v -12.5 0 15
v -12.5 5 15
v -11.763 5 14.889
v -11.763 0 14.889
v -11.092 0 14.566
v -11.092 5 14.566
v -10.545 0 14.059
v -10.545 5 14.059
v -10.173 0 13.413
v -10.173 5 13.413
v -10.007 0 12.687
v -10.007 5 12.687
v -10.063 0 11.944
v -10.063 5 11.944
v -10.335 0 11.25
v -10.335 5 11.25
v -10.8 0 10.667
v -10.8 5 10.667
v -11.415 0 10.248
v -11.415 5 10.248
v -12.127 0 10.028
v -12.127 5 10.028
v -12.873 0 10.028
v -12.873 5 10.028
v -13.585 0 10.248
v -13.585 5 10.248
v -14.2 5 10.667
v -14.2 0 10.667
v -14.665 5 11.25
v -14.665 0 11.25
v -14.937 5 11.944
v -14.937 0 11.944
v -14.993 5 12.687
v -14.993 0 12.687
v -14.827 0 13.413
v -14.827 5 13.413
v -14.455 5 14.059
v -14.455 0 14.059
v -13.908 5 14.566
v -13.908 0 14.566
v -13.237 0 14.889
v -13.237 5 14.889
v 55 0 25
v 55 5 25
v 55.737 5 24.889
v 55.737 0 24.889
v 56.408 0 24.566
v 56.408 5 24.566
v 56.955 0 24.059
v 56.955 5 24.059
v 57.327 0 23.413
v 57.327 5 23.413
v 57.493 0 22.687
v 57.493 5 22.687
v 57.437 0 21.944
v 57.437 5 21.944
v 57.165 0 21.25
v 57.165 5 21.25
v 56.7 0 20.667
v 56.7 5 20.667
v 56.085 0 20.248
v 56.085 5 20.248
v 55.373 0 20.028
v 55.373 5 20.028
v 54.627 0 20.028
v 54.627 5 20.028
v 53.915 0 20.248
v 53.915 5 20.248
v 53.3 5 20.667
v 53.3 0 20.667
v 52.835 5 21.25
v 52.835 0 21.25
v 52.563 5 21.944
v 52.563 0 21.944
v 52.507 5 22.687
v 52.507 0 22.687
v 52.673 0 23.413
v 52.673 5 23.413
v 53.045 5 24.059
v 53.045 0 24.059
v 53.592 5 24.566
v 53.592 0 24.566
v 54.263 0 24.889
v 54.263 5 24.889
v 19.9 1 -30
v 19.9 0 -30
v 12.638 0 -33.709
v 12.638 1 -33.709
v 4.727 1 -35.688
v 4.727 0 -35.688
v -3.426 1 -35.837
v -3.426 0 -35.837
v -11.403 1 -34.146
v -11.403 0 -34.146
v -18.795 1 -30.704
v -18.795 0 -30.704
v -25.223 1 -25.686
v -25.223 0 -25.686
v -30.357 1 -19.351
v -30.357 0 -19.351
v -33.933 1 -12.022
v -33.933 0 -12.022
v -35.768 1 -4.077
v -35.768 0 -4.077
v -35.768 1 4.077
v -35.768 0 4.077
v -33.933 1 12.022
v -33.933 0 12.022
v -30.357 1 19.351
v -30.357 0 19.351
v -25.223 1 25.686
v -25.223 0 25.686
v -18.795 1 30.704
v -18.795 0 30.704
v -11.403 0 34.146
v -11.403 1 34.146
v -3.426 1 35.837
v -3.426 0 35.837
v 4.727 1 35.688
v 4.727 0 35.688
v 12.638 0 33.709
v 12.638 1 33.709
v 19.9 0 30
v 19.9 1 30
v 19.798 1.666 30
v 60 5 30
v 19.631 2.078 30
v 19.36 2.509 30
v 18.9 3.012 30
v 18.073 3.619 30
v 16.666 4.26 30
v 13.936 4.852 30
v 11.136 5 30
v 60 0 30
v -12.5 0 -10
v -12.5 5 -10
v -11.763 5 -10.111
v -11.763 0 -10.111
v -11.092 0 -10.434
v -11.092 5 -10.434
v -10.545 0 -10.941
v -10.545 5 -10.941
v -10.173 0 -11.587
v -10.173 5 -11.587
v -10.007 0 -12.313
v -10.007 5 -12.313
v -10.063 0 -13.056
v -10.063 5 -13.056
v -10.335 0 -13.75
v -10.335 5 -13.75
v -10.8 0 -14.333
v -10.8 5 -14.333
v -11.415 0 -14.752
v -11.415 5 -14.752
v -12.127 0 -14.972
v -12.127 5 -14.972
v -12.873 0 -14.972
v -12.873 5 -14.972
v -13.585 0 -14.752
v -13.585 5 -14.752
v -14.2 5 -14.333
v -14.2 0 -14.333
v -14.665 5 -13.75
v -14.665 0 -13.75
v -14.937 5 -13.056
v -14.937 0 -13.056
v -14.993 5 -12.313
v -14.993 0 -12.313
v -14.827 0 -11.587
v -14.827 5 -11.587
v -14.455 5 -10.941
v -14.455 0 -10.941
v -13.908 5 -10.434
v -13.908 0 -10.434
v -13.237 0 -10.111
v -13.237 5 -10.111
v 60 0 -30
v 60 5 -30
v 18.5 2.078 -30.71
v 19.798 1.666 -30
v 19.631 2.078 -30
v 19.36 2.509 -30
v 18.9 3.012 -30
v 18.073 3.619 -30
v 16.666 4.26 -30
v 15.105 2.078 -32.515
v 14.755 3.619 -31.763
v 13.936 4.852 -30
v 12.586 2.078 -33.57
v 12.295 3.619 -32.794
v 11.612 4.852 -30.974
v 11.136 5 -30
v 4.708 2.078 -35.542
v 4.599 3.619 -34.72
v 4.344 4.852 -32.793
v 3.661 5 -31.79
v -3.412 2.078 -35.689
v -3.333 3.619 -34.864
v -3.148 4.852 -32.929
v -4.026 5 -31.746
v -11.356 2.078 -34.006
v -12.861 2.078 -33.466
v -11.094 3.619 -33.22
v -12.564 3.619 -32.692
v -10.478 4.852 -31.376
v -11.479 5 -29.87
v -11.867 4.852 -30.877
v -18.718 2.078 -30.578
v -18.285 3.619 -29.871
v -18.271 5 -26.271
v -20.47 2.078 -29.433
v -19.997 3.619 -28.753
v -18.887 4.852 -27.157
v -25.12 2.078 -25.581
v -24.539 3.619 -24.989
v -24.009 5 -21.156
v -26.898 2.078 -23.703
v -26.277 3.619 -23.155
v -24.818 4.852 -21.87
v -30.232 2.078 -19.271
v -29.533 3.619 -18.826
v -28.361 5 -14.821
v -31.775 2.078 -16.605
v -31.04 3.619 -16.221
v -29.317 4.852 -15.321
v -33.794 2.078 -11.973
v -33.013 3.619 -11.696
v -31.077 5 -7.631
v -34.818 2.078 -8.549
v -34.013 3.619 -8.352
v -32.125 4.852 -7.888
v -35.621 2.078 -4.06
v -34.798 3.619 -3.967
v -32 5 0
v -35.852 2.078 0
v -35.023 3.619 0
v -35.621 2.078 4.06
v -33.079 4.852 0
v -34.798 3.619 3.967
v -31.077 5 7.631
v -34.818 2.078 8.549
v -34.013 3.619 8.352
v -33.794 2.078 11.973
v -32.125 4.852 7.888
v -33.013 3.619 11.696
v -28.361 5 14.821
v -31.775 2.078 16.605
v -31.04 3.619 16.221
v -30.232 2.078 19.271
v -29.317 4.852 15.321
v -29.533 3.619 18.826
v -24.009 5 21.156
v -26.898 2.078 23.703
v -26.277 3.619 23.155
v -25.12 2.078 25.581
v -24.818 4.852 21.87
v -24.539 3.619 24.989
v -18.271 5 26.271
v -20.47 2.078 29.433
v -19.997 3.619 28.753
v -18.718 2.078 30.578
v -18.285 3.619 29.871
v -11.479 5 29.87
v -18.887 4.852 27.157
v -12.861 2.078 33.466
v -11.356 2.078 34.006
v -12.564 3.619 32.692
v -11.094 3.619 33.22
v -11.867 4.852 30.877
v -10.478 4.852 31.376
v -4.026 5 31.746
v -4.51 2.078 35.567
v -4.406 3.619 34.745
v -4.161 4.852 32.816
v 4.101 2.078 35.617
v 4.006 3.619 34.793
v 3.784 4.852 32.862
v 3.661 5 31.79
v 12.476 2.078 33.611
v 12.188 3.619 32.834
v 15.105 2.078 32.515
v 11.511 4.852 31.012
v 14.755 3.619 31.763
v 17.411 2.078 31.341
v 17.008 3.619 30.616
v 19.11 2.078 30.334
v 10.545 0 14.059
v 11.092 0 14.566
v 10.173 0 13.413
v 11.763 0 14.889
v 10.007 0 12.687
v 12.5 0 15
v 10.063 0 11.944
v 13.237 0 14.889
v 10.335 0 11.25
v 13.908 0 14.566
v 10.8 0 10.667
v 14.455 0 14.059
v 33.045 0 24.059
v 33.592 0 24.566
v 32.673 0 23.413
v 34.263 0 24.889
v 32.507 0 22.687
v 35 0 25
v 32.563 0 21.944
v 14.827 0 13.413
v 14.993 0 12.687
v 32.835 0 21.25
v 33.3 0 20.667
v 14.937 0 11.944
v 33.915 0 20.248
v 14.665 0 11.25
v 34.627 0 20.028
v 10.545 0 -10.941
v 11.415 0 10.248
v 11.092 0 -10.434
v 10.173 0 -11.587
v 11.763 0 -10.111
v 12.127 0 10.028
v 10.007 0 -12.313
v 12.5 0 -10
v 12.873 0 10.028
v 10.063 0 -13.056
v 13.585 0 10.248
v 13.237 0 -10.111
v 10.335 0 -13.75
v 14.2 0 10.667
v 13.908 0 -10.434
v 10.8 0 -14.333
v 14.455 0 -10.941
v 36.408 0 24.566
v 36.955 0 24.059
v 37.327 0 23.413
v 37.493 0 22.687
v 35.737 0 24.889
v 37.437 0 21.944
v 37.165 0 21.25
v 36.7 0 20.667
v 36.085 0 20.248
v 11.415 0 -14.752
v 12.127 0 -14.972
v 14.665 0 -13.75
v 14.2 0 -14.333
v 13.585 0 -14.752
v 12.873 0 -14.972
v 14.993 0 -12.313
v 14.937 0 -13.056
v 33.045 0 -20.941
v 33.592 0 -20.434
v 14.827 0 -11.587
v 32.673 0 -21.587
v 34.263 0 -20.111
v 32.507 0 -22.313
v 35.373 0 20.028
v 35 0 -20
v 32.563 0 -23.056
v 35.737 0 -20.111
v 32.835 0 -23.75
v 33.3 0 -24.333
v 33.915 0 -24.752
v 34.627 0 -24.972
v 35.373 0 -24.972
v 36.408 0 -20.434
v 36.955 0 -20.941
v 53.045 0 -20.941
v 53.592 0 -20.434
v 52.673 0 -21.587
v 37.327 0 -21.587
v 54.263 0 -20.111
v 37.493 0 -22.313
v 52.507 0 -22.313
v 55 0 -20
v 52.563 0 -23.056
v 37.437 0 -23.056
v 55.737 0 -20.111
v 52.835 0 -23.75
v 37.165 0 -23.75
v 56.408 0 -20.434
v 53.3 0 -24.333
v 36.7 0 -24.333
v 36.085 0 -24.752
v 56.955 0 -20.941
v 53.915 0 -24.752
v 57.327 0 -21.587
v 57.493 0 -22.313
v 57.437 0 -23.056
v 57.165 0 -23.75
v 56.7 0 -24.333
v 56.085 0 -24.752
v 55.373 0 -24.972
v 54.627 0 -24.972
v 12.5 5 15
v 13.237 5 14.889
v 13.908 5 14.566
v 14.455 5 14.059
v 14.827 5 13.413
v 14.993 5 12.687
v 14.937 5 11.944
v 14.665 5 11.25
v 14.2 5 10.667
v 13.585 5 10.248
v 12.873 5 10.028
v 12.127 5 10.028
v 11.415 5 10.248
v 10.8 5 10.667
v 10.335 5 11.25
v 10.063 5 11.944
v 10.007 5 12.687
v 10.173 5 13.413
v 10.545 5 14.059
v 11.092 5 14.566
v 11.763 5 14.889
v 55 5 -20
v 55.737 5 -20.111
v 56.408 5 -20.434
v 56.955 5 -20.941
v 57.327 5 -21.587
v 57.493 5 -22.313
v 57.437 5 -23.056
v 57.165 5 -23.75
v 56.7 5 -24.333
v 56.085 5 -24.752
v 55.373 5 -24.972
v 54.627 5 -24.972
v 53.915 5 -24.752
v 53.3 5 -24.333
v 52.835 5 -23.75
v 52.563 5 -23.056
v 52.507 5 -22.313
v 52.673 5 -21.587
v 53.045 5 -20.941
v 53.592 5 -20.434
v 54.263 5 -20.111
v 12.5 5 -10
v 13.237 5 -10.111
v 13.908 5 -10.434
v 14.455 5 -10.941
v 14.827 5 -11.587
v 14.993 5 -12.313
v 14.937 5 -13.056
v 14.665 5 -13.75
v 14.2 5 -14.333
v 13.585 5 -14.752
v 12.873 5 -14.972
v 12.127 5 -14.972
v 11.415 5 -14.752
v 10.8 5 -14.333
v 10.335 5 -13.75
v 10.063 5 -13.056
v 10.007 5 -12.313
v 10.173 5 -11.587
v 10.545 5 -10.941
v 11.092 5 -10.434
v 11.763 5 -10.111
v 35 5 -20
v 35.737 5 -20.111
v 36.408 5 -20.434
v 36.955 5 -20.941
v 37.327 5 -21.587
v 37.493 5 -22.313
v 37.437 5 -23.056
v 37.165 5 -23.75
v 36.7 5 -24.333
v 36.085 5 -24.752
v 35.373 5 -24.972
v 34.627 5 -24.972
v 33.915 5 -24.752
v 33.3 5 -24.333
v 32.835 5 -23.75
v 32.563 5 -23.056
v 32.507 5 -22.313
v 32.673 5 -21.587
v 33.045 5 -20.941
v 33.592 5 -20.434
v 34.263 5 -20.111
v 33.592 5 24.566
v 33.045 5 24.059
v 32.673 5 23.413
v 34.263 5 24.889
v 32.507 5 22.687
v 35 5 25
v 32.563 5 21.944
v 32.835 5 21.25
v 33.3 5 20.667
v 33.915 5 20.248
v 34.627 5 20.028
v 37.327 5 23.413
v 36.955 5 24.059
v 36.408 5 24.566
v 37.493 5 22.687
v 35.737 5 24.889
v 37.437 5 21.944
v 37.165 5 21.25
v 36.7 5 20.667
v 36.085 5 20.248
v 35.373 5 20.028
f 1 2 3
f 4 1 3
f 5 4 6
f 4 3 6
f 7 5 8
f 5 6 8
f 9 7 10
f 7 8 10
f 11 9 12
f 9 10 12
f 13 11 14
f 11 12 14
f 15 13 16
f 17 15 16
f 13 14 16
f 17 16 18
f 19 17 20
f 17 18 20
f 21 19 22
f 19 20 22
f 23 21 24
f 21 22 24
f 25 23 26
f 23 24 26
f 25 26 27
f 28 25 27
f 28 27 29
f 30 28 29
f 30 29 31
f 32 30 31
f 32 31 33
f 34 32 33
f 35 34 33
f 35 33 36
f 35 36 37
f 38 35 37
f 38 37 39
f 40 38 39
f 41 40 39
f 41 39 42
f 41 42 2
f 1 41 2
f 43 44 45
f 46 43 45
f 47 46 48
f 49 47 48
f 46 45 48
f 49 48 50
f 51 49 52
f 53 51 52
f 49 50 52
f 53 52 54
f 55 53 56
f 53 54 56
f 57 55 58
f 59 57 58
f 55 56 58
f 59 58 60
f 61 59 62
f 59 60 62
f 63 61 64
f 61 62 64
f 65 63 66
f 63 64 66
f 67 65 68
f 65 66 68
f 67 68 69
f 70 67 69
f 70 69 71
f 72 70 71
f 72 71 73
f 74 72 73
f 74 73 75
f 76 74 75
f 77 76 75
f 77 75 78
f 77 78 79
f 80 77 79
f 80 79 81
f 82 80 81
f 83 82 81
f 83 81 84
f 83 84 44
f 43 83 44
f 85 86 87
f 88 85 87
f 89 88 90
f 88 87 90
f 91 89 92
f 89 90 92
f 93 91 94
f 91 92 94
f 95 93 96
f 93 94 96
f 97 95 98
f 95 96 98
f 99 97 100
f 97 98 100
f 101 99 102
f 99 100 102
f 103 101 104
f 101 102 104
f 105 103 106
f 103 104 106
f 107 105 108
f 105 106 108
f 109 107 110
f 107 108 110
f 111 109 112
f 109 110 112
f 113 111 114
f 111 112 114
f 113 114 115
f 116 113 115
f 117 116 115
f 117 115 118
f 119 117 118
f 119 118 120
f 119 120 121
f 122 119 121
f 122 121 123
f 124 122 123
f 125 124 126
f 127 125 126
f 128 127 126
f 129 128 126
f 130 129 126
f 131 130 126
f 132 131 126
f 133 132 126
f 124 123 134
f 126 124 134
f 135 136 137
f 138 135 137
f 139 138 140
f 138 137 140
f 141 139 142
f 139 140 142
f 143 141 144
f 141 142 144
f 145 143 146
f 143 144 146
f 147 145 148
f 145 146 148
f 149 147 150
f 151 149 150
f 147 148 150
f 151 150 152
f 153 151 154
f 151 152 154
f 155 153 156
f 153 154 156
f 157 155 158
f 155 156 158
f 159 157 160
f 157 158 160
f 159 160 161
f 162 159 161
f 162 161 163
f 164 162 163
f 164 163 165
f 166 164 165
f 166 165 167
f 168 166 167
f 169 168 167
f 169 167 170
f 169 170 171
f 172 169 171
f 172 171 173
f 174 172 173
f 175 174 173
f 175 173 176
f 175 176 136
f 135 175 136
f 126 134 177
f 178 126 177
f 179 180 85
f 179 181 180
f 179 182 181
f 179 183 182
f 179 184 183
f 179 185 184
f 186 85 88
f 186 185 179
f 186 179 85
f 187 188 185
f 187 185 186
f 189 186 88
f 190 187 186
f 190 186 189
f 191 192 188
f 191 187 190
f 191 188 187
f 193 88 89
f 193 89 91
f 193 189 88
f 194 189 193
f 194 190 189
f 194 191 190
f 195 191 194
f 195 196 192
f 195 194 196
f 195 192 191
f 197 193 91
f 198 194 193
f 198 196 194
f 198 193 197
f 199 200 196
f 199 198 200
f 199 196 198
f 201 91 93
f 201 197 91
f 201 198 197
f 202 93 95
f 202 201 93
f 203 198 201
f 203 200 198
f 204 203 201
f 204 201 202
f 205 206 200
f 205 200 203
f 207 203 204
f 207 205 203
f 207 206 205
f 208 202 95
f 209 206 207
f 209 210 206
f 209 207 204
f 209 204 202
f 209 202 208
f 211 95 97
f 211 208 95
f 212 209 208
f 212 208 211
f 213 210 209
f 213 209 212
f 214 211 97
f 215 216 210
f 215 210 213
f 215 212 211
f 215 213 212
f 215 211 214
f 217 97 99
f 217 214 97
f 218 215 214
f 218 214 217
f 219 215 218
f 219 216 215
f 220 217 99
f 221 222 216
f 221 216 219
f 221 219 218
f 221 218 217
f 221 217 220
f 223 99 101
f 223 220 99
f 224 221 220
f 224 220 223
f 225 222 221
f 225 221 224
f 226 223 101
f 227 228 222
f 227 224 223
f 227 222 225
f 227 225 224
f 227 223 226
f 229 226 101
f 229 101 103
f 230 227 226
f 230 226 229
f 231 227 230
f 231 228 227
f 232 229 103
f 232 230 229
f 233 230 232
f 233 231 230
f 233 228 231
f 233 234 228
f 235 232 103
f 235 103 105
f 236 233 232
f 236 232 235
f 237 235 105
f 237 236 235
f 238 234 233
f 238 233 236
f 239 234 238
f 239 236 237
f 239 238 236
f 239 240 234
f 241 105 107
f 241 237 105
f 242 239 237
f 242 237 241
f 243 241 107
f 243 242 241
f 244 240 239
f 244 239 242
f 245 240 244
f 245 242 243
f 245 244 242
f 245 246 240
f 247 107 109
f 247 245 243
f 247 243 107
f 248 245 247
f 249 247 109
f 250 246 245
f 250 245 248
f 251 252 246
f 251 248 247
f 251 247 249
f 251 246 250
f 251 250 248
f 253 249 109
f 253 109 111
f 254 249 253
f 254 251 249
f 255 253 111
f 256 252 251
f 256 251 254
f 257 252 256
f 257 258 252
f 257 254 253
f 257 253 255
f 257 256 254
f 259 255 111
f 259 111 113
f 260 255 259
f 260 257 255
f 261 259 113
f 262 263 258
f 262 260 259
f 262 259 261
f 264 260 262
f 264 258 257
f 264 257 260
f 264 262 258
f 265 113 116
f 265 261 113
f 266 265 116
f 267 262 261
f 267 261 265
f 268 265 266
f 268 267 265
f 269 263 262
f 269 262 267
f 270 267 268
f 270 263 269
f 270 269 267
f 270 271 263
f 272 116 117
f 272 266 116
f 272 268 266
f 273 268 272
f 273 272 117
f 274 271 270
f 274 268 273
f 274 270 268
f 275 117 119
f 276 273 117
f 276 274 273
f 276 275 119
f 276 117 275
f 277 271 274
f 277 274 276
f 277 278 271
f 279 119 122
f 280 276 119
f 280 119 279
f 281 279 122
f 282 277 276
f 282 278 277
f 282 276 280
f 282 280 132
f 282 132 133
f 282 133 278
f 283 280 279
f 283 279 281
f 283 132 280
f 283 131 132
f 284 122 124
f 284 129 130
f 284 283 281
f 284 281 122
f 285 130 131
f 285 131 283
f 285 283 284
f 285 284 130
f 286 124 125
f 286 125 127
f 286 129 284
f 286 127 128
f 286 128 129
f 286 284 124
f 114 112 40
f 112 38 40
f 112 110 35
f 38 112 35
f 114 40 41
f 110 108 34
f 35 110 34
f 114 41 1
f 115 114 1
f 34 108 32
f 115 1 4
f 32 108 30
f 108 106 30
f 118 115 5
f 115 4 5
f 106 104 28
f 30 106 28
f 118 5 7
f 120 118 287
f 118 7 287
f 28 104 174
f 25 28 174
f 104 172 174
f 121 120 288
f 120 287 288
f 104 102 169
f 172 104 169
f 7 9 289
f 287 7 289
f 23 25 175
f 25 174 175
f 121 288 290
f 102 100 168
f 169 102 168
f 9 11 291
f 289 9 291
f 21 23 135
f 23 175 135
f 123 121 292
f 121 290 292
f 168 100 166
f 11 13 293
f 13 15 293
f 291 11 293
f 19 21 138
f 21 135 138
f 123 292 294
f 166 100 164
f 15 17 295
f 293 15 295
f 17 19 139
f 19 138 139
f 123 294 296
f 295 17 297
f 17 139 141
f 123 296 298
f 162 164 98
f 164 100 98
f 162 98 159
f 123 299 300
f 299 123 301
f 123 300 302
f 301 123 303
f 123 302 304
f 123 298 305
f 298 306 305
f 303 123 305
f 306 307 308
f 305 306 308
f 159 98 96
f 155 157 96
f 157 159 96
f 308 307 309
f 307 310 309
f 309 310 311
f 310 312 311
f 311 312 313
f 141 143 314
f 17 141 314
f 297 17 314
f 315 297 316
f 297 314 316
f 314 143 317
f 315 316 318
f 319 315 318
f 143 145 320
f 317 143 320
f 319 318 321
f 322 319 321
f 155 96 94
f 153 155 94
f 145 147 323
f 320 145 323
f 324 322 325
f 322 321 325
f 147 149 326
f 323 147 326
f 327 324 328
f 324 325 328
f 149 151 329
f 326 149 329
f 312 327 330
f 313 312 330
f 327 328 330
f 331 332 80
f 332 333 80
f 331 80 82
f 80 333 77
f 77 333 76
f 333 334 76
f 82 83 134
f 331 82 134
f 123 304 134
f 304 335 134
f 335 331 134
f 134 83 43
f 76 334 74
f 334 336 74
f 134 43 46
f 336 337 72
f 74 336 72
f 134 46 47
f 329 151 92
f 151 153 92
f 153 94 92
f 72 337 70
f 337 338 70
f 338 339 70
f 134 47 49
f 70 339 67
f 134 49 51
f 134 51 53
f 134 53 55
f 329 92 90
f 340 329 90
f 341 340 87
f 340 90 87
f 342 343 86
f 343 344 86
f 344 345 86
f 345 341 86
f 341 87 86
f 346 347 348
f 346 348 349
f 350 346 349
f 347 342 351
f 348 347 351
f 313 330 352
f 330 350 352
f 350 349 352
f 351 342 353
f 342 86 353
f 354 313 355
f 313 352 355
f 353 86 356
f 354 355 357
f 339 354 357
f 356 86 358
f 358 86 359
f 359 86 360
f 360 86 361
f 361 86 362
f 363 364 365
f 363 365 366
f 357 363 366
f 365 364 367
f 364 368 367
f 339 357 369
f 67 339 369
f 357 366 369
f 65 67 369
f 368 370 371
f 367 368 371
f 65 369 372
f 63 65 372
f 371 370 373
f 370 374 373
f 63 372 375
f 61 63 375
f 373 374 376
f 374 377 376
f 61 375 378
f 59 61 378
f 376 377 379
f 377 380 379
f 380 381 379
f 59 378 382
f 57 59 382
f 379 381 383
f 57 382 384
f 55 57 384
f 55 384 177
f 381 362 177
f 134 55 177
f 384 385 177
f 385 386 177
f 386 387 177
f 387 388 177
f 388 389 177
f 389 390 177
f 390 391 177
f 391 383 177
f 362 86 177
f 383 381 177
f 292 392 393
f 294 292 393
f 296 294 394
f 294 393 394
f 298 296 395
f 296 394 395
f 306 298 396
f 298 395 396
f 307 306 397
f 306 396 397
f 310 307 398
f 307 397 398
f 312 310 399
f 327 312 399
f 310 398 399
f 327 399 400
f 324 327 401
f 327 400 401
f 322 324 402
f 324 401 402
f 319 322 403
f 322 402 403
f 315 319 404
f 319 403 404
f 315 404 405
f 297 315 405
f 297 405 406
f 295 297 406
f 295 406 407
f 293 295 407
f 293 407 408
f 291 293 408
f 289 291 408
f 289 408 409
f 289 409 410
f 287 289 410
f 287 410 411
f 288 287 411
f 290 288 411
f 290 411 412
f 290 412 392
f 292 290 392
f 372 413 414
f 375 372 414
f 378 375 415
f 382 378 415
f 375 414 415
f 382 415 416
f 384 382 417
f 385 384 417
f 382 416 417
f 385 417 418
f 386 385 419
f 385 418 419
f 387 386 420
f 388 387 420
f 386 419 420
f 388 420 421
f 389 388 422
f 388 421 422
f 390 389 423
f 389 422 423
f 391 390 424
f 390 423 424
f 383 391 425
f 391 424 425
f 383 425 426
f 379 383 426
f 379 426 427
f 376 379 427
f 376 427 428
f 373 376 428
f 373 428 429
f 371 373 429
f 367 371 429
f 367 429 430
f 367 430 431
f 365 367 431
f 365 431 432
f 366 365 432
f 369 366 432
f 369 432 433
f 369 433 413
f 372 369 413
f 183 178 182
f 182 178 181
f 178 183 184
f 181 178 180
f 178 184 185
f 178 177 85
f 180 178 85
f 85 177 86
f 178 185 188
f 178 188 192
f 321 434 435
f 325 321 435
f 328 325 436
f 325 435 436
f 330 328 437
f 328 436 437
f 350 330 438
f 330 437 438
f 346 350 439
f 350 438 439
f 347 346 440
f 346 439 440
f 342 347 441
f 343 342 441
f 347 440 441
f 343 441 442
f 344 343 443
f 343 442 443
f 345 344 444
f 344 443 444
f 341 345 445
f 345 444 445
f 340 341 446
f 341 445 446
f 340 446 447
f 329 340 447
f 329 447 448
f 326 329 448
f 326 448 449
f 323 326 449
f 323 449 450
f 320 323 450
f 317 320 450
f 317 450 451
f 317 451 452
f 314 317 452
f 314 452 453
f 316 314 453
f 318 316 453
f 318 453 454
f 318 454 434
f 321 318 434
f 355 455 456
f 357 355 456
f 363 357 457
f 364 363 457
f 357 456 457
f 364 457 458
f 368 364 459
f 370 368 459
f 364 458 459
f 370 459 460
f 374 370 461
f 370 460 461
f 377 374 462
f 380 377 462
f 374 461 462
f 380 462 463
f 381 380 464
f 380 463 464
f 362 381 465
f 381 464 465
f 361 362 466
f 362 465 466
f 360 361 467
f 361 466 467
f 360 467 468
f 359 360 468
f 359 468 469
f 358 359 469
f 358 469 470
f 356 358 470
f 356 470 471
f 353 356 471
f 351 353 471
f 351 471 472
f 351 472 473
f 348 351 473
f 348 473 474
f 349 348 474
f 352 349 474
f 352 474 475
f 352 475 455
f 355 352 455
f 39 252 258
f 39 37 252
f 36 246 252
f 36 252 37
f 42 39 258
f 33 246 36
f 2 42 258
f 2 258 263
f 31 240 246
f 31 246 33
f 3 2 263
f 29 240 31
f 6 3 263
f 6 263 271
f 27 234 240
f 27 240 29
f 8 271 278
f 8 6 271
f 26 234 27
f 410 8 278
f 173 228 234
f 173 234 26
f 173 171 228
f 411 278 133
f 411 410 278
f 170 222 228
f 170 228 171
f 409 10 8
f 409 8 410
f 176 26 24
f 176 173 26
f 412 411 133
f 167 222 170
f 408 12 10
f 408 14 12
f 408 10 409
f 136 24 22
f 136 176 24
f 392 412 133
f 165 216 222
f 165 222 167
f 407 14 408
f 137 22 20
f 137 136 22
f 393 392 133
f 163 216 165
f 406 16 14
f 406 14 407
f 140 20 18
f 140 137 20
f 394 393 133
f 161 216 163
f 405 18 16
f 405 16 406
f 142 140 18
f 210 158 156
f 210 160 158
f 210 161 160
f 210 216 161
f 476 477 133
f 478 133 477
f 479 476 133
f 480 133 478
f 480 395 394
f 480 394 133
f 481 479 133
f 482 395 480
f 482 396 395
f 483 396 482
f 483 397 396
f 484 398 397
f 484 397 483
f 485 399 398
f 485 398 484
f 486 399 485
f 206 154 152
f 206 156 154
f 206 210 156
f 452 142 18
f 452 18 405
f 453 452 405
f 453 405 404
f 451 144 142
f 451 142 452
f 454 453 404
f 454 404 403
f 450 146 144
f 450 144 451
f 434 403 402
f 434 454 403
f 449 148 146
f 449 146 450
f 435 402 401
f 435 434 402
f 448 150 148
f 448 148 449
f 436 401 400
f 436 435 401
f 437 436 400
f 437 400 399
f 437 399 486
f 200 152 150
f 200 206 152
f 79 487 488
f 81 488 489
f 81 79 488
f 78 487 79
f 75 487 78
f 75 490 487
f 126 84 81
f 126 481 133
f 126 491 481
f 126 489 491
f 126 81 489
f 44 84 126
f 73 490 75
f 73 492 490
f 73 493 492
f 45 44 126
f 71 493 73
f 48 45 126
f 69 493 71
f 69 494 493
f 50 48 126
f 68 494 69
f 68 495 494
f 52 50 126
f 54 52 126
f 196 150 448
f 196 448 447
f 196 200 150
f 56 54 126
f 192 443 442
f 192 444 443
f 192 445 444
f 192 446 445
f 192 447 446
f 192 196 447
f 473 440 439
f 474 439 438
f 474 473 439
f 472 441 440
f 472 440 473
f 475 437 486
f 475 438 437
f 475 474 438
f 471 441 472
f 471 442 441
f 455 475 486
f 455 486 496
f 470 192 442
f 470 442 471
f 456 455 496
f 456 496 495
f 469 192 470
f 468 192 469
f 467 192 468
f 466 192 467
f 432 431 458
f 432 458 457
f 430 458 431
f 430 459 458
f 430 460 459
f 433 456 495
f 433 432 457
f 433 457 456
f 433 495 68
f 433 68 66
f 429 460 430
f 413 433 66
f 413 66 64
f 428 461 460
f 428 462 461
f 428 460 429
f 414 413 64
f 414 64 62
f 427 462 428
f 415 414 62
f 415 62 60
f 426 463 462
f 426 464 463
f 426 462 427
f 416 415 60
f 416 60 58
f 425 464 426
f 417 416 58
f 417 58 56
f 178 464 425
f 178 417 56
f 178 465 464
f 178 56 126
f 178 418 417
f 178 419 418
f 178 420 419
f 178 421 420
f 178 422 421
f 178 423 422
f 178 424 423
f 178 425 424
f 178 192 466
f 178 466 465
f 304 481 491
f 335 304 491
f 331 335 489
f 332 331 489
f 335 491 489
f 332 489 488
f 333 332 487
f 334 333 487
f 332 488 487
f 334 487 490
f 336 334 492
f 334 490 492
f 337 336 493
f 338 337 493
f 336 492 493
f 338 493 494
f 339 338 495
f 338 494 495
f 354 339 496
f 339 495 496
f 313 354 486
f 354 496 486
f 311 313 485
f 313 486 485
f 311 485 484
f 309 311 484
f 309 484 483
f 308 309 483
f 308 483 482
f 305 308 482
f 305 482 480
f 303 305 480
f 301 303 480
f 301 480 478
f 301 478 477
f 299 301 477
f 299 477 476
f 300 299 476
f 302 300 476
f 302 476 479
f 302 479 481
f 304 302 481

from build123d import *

# Parameters (mm, degrees)
EXTRUDE_1_DEPTH     = 5
FILLET_1_R          = 4
SKETCH_2_R          = 2.5
CUT_EXTRUDE_1_DEPTH = 71.149839773


with BuildPart() as part:
    # 草图1 → 凸台-拉伸1 (new body)
    with BuildSketch(Plane(origin=(0, 0, 0), x_dir=(1, 0, 0), z_dir=(0, 1, 0))):
        with BuildLine():
            Line((19.899748742, -30), (60, -30))
            Line((60, -30), (60, 30))
            Line((60, 30), (19.899748742, 30))
            ThreePointArc((19.899748742, 30), (-36, 0), (19.899748742, -30))
        make_face()
    extrude(amount=EXTRUDE_1_DEPTH)

    # 圆角1
    fillet_1_edges = [part.edges().sort_by_distance(p)[0] for p in [
        (-36, 5, 0),
    ]]
    fillet(fillet_1_edges, radius=FILLET_1_R)

    # 草图2 → 切除-拉伸1 (cut, through all)
    with BuildSketch(Plane(origin=(0, 5, 0), x_dir=(1, 0, 0), z_dir=(0, 1, 0))):
        with Locations(Location((-12.5, 12.5, 0), (0, 0, 270))):
            Circle(SKETCH_2_R)
        with Locations(Location((12.5, 12.5, 0), (0, 0, 270))):
            Circle(SKETCH_2_R)
        with Locations(Location((12.5, -12.5, 0), (0, 0, 270))):
            Circle(SKETCH_2_R)
        with Locations(Location((-12.5, -12.5, 0), (0, 0, 270))):
            Circle(SKETCH_2_R)
        with Locations(Location((35, 22.5, 0), (0, 0, 270))):
            Circle(SKETCH_2_R)
        with Locations(Location((55, 22.5, 0), (0, 0, 270))):
            Circle(SKETCH_2_R)
        with Locations(Location((55, -22.5, 0), (0, 0, 270))):
            Circle(SKETCH_2_R)
        with Locations(Location((35, -22.5, 0), (0, 0, 270))):
            Circle(SKETCH_2_R)
    extrude(amount=-CUT_EXTRUDE_1_DEPTH, mode=Mode.SUBTRACT)


solid = part.part
